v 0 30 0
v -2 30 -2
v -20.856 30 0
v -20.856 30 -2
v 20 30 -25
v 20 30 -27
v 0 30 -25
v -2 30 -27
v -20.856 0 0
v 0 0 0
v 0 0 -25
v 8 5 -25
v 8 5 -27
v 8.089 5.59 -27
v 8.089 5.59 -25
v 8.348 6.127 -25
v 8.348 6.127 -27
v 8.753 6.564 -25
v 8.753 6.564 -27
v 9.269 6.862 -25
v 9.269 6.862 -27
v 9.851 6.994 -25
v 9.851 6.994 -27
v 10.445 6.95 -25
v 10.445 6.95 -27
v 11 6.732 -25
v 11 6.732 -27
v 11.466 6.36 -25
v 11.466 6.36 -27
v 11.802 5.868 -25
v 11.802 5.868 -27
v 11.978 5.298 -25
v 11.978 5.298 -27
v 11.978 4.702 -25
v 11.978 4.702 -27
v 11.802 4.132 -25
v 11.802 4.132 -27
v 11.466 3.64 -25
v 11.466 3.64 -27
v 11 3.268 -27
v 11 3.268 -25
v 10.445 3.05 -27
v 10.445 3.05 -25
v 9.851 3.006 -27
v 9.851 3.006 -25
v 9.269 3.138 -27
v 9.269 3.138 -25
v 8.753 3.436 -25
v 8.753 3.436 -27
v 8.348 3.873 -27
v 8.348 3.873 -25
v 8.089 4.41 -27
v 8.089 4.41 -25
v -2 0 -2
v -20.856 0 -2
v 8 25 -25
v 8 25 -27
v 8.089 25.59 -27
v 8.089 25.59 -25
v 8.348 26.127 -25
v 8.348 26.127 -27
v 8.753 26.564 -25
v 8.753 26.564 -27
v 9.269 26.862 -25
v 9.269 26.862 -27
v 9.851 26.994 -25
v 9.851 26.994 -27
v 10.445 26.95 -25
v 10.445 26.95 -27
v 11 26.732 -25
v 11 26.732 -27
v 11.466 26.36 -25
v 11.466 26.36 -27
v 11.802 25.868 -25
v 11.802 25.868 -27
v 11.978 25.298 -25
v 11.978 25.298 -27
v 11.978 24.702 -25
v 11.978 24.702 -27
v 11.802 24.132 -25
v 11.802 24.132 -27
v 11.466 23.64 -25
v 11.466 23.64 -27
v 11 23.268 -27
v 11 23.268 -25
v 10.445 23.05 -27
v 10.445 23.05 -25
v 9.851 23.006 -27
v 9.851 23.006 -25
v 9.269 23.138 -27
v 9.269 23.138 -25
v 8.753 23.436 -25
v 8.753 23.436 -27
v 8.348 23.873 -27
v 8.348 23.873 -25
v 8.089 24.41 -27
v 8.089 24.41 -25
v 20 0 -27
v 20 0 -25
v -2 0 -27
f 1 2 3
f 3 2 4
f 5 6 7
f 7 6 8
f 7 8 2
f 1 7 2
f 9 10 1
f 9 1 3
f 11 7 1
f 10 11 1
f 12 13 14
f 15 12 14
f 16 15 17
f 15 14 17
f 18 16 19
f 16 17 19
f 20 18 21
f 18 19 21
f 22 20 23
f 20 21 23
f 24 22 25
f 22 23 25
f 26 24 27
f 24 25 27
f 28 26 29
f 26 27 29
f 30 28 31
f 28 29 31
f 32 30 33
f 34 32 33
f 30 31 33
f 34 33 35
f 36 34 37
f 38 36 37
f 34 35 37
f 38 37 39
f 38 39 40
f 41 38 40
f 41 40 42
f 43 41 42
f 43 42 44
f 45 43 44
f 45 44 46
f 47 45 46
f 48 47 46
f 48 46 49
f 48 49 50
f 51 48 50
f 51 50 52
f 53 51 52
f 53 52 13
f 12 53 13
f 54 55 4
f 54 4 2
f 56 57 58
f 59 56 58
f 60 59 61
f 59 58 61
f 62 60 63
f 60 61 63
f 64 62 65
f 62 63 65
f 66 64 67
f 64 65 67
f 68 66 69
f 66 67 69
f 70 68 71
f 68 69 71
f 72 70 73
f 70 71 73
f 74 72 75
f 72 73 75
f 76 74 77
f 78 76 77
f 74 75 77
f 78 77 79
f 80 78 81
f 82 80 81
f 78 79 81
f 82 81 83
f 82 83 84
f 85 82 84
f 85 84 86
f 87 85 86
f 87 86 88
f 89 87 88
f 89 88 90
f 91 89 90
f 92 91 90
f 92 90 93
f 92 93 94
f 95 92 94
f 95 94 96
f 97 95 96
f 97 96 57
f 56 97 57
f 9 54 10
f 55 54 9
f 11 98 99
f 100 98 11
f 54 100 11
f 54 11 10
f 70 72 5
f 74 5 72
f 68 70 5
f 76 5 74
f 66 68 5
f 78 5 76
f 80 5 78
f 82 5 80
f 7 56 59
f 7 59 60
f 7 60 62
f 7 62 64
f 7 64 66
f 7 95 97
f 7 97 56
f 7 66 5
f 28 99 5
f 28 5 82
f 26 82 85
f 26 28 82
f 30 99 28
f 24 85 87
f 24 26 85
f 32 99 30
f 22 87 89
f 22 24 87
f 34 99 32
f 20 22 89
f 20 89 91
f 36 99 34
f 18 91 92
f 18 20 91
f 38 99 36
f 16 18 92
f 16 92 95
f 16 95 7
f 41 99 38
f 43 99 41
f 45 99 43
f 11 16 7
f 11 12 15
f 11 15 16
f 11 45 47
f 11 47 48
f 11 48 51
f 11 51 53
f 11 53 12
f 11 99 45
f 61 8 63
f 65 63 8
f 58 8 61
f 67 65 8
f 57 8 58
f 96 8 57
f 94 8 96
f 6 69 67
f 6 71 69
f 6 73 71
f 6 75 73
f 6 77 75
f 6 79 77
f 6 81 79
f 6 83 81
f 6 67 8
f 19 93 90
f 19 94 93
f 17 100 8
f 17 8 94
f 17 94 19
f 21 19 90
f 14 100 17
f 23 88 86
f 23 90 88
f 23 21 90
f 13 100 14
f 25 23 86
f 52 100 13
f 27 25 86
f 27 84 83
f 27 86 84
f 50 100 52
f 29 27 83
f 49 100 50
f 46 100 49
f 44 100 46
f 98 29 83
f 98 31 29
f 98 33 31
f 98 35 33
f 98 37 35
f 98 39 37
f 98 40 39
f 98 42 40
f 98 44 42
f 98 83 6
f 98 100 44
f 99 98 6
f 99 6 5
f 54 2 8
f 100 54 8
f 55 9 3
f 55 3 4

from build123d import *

# Parameters (mm, degrees)
EXTRUDE_1_DEPTH     = 30
SKETCH_2_R          = 2
CUT_EXTRUDE_1_DEPTH = 28


with BuildPart() as part:
    # Эскиз1 → Бобышка-Вытянуть1 (new body)
    with BuildSketch(Plane(origin=(0, 0, 0), x_dir=(1, 0, 0), z_dir=(0, 1, 0))):
        Polygon((0, 0), (-20.856344092, 0), (-20.856344092, 2), (-2, 2), (-2, 27), (20, 27), (20, 25), (0, 25), align=None)
    extrude(amount=EXTRUDE_1_DEPTH)

    # Эскиз2 → Вырез-Вытянуть1 (cut, through all)
    with BuildSketch(Plane(origin=(0, 0, -27), x_dir=(-1, 0, 0), z_dir=(0, 0, -1))):
        with Locations((-10, 25)):
            Circle(SKETCH_2_R)
        with Locations((-10, 5)):
            Circle(SKETCH_2_R)
    extrude(amount=-CUT_EXTRUDE_1_DEPTH, mode=Mode.SUBTRACT)


solid = part.part
